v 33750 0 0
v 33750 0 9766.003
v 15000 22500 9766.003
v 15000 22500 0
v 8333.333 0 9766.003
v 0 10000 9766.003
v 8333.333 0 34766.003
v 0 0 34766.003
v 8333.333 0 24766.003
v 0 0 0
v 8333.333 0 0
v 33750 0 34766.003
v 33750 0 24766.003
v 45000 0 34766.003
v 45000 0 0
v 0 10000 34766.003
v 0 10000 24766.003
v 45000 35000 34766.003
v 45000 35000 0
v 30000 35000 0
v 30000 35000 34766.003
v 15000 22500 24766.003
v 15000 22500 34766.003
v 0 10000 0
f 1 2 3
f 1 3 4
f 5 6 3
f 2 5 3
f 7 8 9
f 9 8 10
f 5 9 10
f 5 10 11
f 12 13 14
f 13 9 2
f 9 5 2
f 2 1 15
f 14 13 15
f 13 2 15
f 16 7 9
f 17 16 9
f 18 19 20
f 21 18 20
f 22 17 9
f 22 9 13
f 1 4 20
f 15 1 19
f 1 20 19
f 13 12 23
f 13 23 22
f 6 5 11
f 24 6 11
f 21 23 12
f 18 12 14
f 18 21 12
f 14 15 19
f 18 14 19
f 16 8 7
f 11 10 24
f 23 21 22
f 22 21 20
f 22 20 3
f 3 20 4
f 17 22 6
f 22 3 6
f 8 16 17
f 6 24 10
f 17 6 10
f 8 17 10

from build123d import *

# Parameters (mm, degrees)
BOSS_EXTRUDE1_DEPTH = 34766.002952666
SKETCH2_W           = 19525.624189766
SKETCH2_H           = 10000
SKETCH2_H_2         = 9766.002952666
CUT_EXTRUDE1_DEPTH  = 34999


with BuildPart() as part:
    # Sketch1 → Boss-Extrude1 (new body)
    with BuildSketch(Plane.XY):
        Polygon((0, 10000), (0, 0), (15000, 0), (15000, 22500), align=None)
        Polygon((15000, 22500), (15000, 0), (15913.464519056, 0), (45000, 0), (45000, 35000), (30000, 35000), align=None)
    extrude(amount=BOSS_EXTRUDE1_DEPTH)

    # Sketch2 → Cut-Extrude1 (cut)
    with BuildSketch(Plane(origin=(-4918.032786885, 5901.639344262, 0), x_dir=(0.7682212795973759, 0.6401843996644799, 0), z_dir=(-0.6401843996644799, 0.768221279597376, 0))):
        with Locations((16164.656091528, -29766.002952666)):
            Rectangle(SKETCH2_W, SKETCH2_H)
        with Locations((16164.656091528, -4883.001476333)):
            Rectangle(SKETCH2_W, SKETCH2_H_2)
    extrude(amount=-CUT_EXTRUDE1_DEPTH, mode=Mode.SUBTRACT)


solid = part.part
